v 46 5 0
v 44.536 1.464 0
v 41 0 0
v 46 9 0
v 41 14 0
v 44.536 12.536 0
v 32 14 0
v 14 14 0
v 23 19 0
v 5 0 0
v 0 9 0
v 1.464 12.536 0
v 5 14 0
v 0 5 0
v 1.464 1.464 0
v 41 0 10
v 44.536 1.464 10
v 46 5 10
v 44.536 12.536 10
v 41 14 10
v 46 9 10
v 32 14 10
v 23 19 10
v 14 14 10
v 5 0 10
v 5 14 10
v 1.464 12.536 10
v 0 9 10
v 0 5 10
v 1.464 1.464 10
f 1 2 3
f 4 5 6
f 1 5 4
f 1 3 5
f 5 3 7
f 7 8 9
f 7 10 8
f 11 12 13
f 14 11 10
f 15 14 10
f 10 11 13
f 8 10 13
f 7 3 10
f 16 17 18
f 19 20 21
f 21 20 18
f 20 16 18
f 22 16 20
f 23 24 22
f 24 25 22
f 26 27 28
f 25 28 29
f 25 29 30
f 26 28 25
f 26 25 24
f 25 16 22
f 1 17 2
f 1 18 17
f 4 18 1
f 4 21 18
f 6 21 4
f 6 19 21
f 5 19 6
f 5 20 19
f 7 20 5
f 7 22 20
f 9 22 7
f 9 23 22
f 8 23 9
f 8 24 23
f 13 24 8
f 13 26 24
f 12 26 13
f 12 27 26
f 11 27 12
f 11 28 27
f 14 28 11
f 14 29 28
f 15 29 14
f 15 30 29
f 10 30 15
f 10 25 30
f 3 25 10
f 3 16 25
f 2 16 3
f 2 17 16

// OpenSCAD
$fn = 32;

// ----------------------------------------------------------------------
// Ratchet pawl: 46 x 14 mm body, beak 5 mm сверху
// ----------------------------------------------------------------------

// --- parameters (mm) ---
profile_height = 10;      // extrusion height
profile_points = 15;      // points of the closed outline

profile = [[0, 5], [1.464, 1.464], [5, 0], [41, 0], [44.536, 1.464], [46, 5], [46, 9], [44.536, 12.536], [41, 14], [32, 14], [23, 19], [14, 14], [5, 14], [1.464, 12.536], [0, 9]];  // single closed polygon, 15 points, counter clockwise

// --- the one profile operation ---
linear_extrude(height = profile_height) polygon(points = profile);
